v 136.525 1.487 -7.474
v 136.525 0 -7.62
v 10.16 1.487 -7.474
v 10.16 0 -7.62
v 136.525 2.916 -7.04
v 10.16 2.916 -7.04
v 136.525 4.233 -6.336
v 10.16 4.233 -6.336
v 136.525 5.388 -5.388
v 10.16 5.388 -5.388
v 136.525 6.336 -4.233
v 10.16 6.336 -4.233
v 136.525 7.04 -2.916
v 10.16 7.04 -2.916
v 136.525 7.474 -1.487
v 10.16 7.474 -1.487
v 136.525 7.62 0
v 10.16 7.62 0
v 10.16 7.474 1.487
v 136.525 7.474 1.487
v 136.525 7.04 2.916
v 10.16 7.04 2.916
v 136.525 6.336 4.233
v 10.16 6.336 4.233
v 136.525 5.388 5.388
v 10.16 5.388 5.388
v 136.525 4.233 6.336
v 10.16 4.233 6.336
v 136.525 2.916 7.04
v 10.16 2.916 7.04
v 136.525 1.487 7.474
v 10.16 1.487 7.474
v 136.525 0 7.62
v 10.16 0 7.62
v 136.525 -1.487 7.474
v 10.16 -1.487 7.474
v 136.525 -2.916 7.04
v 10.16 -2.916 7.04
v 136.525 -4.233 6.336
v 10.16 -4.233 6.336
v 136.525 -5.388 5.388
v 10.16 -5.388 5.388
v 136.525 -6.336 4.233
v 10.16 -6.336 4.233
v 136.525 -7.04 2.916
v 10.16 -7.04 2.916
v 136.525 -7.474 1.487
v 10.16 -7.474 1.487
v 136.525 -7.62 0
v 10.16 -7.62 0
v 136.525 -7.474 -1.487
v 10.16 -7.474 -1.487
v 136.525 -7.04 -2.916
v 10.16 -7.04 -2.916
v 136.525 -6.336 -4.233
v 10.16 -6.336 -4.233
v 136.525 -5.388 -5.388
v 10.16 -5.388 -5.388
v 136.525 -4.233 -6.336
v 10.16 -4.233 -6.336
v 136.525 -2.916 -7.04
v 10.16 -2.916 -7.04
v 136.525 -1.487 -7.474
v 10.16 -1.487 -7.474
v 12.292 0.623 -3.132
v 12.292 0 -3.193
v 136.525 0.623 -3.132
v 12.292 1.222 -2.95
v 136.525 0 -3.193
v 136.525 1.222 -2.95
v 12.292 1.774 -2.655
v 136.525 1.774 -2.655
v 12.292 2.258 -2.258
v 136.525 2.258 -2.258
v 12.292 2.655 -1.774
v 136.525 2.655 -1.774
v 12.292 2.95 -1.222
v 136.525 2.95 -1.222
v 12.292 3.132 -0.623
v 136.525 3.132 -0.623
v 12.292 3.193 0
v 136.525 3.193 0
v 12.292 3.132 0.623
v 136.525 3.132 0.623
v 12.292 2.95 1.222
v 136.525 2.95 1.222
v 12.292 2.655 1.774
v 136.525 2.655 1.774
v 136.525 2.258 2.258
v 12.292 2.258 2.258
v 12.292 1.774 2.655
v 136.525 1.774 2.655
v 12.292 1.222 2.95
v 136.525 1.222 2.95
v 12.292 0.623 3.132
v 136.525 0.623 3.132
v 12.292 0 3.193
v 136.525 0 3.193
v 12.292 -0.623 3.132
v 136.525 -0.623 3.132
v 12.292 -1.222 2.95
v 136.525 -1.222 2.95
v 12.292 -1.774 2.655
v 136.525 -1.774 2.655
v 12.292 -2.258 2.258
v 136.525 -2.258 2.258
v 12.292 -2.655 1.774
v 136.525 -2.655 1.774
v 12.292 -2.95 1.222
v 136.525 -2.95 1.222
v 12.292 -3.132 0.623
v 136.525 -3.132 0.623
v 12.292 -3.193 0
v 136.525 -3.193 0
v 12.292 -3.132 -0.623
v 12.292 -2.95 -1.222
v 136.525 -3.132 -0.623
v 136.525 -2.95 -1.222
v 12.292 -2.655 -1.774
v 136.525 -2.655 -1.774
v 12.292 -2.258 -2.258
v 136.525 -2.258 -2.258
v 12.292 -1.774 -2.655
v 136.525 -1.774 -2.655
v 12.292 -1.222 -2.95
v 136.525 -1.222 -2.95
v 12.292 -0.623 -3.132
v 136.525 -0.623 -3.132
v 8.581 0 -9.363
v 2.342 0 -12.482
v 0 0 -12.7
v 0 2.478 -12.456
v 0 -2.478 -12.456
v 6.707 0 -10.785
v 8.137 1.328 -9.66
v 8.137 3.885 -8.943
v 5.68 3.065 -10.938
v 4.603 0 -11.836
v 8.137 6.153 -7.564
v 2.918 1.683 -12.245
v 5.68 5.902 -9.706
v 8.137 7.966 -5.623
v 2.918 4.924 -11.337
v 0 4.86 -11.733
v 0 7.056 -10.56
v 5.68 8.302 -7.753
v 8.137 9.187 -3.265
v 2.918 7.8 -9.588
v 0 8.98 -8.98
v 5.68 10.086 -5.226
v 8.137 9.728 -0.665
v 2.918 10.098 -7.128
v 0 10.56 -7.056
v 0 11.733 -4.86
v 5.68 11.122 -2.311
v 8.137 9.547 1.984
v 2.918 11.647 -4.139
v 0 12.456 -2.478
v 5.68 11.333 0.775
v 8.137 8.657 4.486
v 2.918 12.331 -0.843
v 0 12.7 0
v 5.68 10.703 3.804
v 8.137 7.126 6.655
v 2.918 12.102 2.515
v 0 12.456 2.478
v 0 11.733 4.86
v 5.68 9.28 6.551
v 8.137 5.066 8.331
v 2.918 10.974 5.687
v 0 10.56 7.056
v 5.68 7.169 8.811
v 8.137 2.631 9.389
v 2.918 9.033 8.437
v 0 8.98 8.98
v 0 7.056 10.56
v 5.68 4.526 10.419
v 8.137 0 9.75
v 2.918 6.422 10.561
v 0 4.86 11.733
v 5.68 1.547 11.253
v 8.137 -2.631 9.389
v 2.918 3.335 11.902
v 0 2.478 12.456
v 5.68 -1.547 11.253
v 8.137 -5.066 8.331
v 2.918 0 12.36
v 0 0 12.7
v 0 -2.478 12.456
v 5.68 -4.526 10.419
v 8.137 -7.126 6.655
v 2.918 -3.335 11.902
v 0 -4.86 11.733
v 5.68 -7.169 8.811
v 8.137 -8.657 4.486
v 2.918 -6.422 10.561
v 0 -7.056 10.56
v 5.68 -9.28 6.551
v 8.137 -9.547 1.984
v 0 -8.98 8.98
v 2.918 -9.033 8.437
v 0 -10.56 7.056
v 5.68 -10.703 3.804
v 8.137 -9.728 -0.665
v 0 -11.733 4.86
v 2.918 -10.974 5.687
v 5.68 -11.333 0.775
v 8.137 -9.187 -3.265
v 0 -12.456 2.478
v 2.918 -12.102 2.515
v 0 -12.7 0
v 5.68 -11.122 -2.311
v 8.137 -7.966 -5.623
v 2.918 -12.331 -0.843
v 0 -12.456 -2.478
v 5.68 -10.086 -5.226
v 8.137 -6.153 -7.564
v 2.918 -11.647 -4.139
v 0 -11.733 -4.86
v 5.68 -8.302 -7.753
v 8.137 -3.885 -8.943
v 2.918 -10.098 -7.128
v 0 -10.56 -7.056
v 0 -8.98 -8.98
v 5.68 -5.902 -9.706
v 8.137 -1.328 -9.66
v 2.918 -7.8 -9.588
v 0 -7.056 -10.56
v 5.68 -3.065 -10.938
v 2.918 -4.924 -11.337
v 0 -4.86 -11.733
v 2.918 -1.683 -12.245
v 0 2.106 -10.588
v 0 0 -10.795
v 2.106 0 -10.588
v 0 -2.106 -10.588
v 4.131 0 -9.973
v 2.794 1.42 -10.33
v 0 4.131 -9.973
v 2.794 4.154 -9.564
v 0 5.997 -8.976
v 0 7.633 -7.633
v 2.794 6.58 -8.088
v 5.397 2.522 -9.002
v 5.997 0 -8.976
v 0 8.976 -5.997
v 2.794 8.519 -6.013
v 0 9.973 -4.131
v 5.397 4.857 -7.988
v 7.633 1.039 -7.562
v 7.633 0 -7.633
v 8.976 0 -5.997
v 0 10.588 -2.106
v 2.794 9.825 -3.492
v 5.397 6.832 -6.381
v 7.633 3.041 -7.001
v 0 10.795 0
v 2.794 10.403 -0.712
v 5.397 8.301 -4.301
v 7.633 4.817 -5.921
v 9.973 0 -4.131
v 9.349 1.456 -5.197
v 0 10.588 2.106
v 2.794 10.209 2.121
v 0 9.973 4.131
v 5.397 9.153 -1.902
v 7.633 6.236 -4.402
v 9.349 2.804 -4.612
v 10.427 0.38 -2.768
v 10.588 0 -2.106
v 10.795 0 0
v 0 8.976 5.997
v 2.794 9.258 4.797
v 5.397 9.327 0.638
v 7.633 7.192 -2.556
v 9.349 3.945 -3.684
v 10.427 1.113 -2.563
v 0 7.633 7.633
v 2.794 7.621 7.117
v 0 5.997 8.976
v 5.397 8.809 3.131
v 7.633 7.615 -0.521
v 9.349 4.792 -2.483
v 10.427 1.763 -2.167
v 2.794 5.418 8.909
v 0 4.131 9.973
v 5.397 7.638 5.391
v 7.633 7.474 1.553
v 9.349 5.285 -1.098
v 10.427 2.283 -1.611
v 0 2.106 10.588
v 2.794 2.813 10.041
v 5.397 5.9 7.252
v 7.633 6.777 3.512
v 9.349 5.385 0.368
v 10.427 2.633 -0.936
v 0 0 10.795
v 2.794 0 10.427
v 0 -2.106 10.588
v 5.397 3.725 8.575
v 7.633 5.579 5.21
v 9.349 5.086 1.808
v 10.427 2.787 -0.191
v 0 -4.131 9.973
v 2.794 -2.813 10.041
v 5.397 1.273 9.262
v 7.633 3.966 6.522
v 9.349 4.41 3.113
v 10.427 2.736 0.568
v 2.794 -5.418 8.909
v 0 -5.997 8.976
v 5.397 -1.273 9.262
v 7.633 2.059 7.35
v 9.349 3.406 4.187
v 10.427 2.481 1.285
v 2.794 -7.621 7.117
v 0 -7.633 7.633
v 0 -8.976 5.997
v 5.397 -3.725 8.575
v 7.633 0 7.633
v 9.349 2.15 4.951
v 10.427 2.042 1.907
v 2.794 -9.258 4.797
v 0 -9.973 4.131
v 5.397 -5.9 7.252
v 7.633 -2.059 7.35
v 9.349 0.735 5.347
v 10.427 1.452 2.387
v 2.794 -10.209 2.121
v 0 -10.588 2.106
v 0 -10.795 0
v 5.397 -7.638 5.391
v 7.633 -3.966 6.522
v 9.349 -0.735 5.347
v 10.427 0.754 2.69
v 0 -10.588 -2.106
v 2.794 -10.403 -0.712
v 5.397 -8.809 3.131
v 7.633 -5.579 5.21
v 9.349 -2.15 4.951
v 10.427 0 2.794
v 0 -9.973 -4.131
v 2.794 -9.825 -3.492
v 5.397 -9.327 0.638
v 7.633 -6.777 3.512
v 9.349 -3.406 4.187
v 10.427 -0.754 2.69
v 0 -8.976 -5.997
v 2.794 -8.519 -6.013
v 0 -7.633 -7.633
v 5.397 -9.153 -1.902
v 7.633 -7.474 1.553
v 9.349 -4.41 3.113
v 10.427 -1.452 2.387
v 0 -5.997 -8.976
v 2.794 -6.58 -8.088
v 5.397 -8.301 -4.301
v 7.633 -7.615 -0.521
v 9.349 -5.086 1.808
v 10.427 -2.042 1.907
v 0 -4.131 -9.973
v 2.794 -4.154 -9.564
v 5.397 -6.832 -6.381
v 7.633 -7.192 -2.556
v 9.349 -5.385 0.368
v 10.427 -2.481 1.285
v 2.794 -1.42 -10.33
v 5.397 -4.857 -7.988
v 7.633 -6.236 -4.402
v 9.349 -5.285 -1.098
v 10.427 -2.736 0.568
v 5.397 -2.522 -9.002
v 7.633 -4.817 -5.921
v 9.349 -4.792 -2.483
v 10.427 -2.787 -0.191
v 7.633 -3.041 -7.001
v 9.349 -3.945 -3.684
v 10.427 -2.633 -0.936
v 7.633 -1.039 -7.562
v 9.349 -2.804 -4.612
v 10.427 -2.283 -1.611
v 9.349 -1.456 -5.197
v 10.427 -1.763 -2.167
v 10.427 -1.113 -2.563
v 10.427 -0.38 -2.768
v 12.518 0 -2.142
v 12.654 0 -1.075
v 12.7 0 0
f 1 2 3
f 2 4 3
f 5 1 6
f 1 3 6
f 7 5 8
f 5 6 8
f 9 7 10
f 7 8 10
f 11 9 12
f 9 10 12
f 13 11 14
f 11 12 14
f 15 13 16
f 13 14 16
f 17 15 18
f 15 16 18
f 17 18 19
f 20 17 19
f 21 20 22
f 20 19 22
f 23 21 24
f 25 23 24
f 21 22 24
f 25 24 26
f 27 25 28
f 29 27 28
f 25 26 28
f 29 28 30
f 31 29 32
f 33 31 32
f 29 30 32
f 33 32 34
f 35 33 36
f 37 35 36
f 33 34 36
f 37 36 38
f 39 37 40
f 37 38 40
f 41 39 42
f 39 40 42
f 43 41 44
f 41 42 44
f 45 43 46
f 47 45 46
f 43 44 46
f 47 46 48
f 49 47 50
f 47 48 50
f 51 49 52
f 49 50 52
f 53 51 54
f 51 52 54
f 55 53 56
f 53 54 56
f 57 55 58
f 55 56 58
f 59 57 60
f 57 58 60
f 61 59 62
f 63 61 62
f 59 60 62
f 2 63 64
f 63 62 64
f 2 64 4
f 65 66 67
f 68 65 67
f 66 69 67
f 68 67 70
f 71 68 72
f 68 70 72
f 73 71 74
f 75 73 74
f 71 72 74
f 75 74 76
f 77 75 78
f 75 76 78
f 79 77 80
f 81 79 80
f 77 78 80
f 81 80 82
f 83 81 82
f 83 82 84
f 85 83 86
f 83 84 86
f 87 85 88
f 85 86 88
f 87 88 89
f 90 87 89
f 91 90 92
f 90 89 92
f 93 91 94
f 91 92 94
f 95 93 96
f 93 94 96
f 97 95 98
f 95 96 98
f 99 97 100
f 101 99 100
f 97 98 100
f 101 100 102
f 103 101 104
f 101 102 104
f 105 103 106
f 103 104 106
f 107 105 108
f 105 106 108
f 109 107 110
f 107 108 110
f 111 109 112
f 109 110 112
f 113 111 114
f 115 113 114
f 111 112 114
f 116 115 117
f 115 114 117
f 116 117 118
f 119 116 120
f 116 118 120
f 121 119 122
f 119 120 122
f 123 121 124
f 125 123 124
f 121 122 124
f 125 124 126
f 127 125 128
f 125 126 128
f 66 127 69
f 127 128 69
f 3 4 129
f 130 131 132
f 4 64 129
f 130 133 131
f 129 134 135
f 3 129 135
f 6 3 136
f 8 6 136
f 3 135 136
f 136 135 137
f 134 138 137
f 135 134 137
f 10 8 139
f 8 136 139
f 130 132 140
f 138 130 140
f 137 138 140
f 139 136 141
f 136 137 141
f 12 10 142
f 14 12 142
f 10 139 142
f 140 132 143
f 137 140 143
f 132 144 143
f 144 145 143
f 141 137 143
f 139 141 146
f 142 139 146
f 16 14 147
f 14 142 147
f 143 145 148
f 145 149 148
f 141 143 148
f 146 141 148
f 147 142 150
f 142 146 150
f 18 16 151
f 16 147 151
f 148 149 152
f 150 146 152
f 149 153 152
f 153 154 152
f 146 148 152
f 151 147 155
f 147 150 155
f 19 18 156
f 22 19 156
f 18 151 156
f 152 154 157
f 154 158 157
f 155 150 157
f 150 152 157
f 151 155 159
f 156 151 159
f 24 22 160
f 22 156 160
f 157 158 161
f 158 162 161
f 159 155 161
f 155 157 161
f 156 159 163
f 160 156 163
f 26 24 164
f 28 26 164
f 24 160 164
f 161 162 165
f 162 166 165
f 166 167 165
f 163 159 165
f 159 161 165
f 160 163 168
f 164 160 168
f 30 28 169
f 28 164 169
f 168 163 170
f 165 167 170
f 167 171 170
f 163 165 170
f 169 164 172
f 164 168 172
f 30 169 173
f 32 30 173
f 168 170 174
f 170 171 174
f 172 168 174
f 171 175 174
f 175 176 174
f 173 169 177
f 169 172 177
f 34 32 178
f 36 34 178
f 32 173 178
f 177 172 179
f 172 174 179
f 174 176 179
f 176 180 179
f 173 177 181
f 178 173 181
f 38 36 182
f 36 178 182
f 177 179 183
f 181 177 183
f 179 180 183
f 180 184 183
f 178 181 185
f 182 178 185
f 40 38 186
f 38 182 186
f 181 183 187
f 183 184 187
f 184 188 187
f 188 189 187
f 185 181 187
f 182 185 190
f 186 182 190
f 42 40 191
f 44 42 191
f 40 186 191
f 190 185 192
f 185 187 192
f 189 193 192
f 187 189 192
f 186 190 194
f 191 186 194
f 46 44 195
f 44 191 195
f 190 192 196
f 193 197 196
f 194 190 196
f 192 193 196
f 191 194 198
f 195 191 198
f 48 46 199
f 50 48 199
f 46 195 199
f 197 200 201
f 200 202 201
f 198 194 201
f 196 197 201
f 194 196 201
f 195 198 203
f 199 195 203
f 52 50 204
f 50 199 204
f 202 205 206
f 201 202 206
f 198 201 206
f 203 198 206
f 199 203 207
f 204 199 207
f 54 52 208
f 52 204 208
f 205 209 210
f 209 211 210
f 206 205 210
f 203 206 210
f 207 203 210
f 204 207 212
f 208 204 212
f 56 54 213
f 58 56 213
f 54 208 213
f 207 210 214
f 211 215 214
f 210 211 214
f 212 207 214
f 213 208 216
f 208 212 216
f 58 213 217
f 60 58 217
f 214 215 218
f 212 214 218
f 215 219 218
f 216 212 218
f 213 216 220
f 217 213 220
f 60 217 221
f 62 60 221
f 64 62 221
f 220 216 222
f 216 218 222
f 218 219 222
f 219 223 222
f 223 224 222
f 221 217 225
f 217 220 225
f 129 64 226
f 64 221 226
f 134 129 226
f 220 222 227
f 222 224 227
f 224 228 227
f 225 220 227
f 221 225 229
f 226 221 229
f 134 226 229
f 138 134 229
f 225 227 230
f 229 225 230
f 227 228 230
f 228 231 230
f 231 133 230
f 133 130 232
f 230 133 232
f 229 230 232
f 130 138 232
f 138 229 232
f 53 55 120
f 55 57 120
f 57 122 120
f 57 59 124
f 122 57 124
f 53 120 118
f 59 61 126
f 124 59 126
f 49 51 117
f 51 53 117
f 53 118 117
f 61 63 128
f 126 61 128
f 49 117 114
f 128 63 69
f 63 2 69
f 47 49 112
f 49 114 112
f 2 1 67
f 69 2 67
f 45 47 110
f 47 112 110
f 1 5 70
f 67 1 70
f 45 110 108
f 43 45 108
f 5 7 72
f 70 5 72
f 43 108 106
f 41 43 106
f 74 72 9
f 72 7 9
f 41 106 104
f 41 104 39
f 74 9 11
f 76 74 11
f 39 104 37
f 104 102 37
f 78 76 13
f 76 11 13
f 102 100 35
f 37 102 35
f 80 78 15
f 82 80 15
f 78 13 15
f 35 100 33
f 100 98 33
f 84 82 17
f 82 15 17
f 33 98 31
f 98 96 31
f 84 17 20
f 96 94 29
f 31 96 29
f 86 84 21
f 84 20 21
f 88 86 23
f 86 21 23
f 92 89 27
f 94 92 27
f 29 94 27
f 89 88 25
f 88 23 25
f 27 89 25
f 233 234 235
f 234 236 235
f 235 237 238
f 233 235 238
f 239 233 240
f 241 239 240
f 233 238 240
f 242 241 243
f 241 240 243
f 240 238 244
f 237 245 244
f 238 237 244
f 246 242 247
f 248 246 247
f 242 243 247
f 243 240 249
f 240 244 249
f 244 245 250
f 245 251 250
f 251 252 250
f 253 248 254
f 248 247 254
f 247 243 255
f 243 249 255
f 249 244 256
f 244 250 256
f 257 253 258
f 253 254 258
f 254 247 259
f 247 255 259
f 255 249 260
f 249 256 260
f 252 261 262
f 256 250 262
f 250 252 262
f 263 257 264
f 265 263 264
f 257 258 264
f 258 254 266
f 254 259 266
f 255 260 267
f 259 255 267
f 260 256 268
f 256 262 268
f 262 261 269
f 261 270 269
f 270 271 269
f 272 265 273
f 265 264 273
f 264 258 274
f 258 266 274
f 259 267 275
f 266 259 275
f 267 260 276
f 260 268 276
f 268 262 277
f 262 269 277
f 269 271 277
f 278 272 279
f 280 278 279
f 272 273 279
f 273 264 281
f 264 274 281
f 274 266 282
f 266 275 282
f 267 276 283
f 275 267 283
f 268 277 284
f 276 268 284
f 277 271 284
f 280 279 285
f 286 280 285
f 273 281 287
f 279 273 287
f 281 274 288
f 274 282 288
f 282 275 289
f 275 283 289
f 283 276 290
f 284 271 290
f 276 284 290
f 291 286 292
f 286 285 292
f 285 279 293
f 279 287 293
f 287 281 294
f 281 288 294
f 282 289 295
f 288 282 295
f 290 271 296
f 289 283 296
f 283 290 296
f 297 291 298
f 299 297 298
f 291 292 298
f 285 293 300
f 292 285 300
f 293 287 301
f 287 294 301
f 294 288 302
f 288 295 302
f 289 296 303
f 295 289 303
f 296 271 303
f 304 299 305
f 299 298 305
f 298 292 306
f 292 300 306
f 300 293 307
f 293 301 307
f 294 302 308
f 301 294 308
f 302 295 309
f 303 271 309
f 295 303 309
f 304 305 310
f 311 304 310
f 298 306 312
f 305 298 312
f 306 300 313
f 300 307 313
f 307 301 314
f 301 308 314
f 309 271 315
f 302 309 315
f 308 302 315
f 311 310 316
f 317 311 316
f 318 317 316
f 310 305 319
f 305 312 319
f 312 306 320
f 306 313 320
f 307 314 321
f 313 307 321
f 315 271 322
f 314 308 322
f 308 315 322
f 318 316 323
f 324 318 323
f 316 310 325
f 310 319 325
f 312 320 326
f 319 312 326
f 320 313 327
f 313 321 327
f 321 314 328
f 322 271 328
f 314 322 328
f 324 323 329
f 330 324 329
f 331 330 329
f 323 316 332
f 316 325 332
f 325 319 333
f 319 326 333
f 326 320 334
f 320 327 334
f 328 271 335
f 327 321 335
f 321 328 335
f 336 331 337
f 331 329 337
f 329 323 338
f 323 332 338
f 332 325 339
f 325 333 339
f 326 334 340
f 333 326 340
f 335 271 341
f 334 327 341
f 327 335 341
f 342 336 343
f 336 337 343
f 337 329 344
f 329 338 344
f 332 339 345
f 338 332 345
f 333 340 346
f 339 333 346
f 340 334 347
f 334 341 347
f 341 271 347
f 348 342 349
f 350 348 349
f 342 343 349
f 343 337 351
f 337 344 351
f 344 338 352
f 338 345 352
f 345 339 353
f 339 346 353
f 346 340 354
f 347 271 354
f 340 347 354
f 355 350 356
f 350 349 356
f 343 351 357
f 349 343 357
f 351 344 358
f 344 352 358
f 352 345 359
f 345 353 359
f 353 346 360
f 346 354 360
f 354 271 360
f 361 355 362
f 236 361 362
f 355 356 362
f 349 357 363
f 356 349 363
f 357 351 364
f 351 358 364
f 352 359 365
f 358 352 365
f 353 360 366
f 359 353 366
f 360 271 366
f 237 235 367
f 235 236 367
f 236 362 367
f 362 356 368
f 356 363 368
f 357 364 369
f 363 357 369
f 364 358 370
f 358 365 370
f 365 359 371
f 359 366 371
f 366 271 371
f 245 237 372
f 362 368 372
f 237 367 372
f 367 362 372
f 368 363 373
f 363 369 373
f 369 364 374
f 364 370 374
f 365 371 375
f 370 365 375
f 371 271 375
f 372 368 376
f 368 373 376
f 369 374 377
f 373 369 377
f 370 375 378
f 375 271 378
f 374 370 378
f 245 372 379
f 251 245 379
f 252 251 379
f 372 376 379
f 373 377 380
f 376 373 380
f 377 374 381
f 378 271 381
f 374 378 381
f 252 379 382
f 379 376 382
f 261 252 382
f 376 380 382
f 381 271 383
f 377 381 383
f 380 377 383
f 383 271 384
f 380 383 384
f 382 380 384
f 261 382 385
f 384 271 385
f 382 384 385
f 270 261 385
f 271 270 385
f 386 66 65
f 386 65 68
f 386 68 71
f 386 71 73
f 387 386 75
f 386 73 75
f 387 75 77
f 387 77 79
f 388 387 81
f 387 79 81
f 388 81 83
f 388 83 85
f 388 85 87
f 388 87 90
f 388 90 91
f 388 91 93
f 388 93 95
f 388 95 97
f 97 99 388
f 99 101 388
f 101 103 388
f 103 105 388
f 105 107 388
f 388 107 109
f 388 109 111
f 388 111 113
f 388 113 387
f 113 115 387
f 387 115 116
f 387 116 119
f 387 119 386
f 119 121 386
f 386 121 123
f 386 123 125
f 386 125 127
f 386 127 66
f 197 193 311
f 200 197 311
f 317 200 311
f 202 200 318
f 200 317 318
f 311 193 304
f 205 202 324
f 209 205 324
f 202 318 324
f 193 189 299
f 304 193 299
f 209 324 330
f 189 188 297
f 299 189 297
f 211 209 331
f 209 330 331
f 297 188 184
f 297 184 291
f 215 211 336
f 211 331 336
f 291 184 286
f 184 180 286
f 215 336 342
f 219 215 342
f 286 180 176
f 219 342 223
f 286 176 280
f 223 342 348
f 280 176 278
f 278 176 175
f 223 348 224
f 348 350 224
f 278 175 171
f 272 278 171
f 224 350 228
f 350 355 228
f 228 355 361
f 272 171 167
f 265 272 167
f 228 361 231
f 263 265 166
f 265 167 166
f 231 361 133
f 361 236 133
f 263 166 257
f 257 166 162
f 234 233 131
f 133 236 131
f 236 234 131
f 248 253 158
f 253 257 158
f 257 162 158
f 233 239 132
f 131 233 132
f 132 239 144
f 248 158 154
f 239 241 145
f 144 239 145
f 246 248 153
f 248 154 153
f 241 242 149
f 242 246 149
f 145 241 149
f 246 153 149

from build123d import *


with BuildPart() as part:
    # Sketch1 → Revolve1 (revolve)
    with BuildSketch(Plane(origin=(0, 0, 0), x_dir=(1, 0, 0), z_dir=(0, 1, 0))):
        with BuildLine():
            Line((0, 12.7), (0, 10.795))
            ThreePointArc((0, 10.795), (7.633217703, 7.633217703), (10.795, 0))
            Line((10.795, 0), (12.7, 0))
            ThreePointArc((12.7, 0), (12.597580707, 1.609646024), (12.291974752, 3.193330031))
            Line((12.291974752, 3.193330031), (136.525, 3.193330031))
            Line((136.525, 3.193330031), (136.525, 7.62))
            Line((136.525, 7.62), (10.16, 7.62))
            ThreePointArc((10.16, 7.62), (5.679612663, 11.359225326), (0, 12.7))
        make_face()
    revolve(axis=Axis((0, 0, 0), (1, 0, 0)))


solid = part.part
